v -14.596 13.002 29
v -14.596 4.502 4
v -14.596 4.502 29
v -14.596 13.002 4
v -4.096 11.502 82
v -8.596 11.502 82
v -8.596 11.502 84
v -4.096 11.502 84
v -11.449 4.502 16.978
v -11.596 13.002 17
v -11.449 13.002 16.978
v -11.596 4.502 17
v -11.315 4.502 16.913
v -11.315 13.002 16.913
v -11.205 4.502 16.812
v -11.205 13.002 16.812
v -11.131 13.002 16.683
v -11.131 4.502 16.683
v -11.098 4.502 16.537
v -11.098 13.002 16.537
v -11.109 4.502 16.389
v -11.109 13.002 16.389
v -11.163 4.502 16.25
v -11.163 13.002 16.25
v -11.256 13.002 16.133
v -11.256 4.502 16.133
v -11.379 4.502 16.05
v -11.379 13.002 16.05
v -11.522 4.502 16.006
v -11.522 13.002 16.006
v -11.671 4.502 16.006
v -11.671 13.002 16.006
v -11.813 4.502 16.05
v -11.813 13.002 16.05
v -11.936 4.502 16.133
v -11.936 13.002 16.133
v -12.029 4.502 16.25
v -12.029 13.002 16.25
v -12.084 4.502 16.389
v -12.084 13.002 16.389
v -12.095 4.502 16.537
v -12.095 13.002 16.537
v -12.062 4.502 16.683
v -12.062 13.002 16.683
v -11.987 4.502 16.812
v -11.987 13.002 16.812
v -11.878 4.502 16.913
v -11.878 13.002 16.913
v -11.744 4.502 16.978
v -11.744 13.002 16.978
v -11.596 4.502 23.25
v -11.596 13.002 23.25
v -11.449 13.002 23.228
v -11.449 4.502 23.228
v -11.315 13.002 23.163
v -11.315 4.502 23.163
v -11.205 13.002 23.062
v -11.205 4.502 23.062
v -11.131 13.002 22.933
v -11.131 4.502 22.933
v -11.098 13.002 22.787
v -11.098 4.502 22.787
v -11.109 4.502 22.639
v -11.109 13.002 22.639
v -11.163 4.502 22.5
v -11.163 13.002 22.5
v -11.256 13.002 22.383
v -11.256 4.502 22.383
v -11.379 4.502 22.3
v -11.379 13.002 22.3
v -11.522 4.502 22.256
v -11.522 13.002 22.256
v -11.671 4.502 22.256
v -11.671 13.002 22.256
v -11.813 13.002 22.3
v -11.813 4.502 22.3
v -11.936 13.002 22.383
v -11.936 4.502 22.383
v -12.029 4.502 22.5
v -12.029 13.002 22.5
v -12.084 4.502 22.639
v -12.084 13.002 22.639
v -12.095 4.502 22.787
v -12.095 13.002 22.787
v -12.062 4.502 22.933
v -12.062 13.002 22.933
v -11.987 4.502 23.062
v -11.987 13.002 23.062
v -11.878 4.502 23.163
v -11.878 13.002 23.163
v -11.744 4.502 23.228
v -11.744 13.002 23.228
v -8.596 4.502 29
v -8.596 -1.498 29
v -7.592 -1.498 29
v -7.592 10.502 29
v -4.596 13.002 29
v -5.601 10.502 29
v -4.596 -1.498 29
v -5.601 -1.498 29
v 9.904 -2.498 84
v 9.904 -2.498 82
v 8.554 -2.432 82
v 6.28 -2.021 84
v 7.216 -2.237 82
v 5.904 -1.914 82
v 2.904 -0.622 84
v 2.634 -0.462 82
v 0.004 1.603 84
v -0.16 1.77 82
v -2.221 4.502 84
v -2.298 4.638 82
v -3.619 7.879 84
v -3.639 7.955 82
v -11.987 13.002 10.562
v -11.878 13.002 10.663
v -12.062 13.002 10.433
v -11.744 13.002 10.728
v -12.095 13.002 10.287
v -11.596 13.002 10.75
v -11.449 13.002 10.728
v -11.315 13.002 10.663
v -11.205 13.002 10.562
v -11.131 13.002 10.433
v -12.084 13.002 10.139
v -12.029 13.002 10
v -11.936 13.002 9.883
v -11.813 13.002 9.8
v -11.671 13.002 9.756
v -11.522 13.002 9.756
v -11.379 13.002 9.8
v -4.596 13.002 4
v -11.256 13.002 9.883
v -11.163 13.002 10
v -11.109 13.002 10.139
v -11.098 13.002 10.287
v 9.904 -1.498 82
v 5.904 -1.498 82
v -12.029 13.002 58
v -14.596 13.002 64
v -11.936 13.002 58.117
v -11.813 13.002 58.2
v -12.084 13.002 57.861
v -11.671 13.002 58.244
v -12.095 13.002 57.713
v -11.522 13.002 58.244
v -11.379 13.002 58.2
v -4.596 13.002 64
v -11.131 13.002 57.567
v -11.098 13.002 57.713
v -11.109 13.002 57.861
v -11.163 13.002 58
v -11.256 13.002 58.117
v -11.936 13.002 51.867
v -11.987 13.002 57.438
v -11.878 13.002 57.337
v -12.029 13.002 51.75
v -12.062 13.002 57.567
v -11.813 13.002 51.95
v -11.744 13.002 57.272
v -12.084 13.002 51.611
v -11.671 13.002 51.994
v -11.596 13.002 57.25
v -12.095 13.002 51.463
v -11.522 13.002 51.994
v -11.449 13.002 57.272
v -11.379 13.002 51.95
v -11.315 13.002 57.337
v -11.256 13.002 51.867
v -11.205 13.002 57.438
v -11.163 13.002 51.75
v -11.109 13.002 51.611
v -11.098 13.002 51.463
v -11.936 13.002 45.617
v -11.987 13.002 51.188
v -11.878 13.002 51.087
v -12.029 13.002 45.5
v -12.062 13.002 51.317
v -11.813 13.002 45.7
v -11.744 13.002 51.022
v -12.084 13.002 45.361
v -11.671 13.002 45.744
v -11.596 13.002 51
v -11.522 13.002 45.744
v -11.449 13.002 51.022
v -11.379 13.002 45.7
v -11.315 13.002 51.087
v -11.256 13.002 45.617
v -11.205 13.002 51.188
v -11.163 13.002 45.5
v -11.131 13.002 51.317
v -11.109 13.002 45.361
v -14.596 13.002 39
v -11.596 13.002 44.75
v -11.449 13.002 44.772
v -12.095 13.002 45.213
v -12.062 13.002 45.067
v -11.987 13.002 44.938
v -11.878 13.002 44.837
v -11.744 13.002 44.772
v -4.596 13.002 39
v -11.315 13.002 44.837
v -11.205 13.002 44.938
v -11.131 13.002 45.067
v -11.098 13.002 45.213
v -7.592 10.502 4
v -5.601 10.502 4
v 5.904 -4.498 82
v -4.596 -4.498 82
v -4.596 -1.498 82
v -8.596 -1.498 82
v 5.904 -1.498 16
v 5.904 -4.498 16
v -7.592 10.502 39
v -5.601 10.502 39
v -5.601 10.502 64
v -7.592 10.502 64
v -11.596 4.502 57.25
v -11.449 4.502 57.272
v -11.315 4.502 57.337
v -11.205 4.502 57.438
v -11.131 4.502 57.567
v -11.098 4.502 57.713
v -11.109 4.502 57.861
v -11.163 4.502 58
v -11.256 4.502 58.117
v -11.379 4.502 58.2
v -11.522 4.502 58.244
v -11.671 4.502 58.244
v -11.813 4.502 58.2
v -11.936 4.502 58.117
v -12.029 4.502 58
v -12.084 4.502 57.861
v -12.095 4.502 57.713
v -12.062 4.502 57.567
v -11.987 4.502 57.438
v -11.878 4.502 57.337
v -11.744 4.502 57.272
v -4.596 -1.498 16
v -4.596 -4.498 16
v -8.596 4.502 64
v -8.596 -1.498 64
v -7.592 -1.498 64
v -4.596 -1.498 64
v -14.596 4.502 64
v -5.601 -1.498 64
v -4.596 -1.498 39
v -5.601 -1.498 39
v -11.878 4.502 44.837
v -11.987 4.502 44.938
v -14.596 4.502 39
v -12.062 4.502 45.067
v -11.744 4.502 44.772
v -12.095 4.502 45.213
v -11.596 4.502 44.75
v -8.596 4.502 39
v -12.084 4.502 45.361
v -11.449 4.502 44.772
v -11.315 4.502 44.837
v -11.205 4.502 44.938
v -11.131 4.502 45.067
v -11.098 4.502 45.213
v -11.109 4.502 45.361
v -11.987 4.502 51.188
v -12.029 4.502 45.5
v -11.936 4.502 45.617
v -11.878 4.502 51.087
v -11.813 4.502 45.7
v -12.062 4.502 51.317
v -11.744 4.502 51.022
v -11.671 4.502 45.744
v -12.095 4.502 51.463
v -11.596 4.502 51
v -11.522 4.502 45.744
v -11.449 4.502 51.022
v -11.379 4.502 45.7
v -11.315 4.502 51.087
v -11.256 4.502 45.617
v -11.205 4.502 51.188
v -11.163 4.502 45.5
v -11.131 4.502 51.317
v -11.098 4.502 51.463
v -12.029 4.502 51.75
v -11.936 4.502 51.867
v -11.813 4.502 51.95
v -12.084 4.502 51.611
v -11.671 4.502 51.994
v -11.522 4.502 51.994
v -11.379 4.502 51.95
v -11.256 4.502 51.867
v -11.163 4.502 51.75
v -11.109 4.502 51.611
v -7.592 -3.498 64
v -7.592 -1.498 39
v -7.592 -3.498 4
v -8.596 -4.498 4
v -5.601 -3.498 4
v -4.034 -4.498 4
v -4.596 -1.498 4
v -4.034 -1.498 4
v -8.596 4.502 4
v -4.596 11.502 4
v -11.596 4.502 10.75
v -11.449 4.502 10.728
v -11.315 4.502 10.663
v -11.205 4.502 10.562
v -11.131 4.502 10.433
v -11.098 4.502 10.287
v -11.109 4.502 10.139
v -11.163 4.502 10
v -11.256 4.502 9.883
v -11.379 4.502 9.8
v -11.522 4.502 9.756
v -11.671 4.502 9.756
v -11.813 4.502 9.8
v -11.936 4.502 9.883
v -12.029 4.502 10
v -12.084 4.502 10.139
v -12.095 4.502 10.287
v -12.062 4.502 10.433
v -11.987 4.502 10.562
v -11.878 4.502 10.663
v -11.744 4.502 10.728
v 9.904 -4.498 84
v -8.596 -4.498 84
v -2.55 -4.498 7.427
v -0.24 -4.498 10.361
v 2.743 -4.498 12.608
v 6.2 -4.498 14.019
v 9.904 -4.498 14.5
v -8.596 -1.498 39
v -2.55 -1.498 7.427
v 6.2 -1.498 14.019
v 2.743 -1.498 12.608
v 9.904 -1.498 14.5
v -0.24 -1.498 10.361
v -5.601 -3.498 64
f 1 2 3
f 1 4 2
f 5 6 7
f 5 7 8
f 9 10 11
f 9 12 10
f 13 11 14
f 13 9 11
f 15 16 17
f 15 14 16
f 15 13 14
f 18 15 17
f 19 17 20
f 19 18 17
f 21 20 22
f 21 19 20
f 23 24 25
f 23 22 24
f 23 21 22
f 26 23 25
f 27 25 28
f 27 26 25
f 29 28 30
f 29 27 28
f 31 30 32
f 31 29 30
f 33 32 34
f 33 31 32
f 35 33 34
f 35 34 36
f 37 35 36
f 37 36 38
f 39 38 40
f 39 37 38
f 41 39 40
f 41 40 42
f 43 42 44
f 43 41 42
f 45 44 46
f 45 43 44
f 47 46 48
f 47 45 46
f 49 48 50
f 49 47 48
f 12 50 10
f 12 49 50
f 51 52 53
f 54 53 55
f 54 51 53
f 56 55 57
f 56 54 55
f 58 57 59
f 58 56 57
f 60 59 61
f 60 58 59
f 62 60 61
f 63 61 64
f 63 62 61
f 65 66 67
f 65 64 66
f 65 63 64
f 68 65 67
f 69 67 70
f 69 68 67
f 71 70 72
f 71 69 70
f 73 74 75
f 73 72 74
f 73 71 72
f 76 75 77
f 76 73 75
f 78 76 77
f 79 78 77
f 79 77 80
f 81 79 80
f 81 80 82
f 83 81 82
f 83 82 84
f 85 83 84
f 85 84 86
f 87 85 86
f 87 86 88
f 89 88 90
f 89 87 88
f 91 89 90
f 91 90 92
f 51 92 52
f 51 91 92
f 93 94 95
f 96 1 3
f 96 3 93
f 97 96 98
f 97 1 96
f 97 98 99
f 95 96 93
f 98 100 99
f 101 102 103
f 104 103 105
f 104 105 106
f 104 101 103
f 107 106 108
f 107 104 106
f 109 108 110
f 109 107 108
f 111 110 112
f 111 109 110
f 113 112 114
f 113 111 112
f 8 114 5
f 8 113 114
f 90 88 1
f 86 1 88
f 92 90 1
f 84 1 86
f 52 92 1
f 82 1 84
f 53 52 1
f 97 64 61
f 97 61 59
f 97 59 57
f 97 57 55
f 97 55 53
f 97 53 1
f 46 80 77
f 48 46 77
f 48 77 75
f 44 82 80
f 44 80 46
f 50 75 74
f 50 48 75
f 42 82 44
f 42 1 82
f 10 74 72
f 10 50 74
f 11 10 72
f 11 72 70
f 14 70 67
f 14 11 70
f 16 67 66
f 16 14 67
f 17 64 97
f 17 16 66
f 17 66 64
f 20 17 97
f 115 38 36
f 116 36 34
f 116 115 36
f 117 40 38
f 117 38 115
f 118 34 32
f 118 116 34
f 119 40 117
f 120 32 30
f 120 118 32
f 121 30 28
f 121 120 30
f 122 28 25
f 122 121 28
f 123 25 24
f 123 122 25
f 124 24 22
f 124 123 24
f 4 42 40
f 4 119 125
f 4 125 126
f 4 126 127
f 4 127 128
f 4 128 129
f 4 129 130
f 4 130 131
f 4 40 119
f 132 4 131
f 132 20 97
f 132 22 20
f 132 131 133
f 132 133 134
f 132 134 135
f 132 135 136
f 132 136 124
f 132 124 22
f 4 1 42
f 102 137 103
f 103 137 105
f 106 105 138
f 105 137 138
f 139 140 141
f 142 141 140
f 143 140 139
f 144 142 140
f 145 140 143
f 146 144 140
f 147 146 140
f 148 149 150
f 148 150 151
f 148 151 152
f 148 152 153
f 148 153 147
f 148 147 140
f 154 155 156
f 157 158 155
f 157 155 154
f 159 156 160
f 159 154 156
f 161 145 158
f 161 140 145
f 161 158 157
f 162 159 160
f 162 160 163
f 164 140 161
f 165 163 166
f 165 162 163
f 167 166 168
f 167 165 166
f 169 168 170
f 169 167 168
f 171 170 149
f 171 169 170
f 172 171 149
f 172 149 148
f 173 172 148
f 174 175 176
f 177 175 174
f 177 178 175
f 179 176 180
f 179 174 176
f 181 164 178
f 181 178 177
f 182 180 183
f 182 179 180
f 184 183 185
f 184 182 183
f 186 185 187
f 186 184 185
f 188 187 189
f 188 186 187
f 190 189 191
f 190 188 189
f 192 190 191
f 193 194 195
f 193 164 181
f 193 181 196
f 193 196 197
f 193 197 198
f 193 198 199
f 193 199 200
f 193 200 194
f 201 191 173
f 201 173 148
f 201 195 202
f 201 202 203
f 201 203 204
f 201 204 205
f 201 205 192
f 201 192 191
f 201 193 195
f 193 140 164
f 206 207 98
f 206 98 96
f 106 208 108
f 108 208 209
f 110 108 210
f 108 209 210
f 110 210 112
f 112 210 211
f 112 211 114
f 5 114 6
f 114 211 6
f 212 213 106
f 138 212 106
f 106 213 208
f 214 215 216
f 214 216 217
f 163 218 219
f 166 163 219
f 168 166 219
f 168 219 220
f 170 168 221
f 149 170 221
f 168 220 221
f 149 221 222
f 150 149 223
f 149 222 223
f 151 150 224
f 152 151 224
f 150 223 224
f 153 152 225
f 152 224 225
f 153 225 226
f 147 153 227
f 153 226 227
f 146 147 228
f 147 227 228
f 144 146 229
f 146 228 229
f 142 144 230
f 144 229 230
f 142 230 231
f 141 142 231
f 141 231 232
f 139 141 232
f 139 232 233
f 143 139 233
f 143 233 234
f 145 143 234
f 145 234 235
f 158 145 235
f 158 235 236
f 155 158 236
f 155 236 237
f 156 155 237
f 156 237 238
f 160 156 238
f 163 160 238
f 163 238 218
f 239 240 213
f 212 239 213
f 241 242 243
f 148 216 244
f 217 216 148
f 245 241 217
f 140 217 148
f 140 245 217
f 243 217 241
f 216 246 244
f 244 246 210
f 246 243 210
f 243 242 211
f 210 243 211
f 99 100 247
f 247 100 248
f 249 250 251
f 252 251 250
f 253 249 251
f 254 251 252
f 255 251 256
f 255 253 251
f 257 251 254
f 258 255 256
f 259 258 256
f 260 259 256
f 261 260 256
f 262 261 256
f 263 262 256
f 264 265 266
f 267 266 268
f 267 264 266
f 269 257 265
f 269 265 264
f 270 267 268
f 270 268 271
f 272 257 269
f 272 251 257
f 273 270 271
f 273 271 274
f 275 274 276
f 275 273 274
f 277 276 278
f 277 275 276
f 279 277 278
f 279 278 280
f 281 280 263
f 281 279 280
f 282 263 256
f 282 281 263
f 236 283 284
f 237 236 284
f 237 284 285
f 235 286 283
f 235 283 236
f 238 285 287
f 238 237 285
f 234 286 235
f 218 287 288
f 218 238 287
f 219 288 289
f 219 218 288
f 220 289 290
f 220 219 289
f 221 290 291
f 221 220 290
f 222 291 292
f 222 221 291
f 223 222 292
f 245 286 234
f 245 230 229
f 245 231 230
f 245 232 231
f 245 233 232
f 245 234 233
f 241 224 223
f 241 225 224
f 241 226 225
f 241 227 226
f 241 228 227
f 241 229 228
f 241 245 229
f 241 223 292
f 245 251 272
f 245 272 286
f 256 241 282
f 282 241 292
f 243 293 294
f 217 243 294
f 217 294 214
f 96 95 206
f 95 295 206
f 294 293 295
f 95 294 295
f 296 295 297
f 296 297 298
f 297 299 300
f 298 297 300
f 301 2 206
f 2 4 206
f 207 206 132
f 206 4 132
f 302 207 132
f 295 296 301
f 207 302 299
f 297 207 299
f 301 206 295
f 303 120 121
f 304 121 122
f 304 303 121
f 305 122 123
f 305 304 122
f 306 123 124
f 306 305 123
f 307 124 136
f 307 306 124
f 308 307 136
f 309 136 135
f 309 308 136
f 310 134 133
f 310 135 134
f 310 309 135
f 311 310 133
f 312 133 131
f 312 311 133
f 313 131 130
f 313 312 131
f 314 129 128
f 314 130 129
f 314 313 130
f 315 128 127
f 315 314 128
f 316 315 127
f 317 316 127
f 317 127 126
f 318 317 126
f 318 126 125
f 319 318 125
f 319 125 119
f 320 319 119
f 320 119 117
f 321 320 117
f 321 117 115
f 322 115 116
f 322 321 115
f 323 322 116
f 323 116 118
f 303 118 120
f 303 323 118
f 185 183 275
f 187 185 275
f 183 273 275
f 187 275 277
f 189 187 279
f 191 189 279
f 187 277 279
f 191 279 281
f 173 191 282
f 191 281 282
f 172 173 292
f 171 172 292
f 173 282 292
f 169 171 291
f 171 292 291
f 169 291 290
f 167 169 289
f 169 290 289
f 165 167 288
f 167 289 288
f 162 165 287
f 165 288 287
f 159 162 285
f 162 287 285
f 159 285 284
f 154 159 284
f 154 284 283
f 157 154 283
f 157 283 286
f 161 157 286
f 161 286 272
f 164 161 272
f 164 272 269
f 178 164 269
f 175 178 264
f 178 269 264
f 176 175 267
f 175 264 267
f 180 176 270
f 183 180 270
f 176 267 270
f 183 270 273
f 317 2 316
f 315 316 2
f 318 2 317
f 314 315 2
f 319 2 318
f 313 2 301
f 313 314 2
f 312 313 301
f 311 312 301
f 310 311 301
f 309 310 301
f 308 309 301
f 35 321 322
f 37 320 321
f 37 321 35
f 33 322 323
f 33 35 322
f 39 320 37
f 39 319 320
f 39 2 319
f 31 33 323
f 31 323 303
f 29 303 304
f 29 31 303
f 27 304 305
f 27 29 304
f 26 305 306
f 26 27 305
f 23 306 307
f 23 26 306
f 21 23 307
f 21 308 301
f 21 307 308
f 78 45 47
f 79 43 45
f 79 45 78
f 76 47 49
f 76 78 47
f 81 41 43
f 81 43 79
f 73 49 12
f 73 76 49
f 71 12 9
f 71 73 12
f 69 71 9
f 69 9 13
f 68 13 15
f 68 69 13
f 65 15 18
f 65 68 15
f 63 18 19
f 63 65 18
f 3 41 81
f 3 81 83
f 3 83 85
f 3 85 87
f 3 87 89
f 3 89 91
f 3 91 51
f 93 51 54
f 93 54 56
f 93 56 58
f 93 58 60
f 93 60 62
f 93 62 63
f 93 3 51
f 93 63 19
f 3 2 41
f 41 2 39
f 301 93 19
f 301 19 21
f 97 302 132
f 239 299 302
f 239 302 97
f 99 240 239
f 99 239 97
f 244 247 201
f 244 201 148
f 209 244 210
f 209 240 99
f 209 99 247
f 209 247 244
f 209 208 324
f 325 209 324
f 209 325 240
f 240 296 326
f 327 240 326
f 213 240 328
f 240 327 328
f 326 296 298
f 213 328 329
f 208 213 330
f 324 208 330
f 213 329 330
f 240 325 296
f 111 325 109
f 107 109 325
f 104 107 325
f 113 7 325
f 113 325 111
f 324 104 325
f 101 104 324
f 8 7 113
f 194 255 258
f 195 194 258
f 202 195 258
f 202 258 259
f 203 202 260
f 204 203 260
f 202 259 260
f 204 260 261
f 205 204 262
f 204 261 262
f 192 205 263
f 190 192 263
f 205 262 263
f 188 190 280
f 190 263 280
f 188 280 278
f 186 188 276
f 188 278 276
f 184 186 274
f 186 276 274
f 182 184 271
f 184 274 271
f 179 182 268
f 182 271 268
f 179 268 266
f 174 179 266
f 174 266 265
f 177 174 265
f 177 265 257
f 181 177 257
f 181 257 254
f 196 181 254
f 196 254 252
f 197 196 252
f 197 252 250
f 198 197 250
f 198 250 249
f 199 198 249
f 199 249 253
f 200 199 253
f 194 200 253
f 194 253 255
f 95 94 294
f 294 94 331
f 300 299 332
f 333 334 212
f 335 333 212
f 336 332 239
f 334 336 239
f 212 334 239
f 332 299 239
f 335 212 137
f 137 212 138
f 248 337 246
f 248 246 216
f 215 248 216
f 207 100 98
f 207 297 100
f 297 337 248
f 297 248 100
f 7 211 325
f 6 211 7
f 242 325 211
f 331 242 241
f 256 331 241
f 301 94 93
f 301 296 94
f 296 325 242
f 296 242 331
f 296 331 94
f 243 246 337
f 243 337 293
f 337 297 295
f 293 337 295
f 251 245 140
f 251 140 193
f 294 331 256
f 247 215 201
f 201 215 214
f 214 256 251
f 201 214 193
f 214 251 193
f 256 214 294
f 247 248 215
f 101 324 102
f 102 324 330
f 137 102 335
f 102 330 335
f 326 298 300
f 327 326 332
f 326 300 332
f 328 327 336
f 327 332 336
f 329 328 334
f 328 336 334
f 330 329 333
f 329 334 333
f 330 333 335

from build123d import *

# Parameters (mm, degrees)
SALIENTE_EXTRUIR1_DEPTH = 82
CROQUIS3_W              = 10
CROQUIS3_H              = 25
SALIENTE_EXTRUIR2_DEPTH = 1.5
CROQUIS4_W              = 18.5
CROQUIS4_H              = 16
SALIENTE_EXTRUIR3_DEPTH = 2
CROQUIS5_R              = 14.5
CORTAR_EXTRUIR1_DEPTH   = 87.482953955
CROQUIS13_W             = 7.672796091
CROQUIS13_H             = 18.470403829
CROQUIS13_W_2           = 10
CROQUIS13_H_2           = 13
CROQUIS13_W_3           = 18
CORTAR_EXTRUIR9_DEPTH   = 13
CORTAR_EXTRUIR10_DEPTH  = 2
CROQUIS15_W             = 1.990683477
CROQUIS15_H             = 14
CORTAR_EXTRUIR11_DEPTH  = 60
CROQUIS16_W             = 10.5
CROQUIS16_H             = 66
CORTAR_EXTRUIR12_DEPTH  = 10
CROQUIS19_W             = 6
CROQUIS19_H             = 25
SALIENTE_EXTRUIR7_DEPTH = 7
CROQUIS23_R             = 0.5
CORTAR_EXTRUIR13_DEPTH  = 86.732440329


with BuildPart() as part:
    # Croquis2 → Saliente-Extruir1 (new body)
    with BuildSketch(Plane.XY):
        Polygon((-4.596277774, 11.502403514), (-4.596277774, -1.497596486), (9.903722226, -1.497596486), (9.903722226, -4.497596486), (-4.596277774, -4.497596486), (-8.596277774, -4.497596486), (-8.596277774, 11.502403514), align=None)
    extrude(amount=SALIENTE_EXTRUIR1_DEPTH)

    # Croquis3 → Saliente-Extruir2 (add)
    with BuildSketch(Plane(origin=(0, 11.502403514, 0), x_dir=(1, 0, 0), z_dir=(0, 1, 0))):
        with Locations((-9.596277774, -16.5)):
            Rectangle(CROQUIS3_W, CROQUIS3_H)
        with Locations((-9.596277774, -51.5)):
            Rectangle(CROQUIS3_W, CROQUIS3_H)
    extrude(amount=SALIENTE_EXTRUIR2_DEPTH)

    # Croquis4 → Saliente-Extruir3 (add)
    with BuildSketch(Plane.XY.offset(82)):
        with Locations((0.653722226, 3.502403514)):
            Rectangle(CROQUIS4_W, CROQUIS4_H)
    extrude(amount=SALIENTE_EXTRUIR3_DEPTH)

    # Croquis5 → Cortar-Extruir1 (cut, through all)
    with BuildSketch(Plane(origin=(0, -1.497596486, 0), x_dir=(1, 0, 0), z_dir=(0, 1, 0))):
        with Locations((9.903722226, 0)):
            Circle(CROQUIS5_R)
    extrude(amount=-CORTAR_EXTRUIR1_DEPTH, mode=Mode.SUBTRACT)

    # Croquis13 → Cortar-Extruir9 (cut)
    with BuildSketch(Plane.ZY.offset(8.596277774)):
        with Locations((0.163601954, 2.2672016)):
            Rectangle(CROQUIS13_W, CROQUIS13_H)
        with Locations((34, 5.002403514)):
            Rectangle(CROQUIS13_W_2, CROQUIS13_H_2)
        with Locations((73, 5.002403514)):
            Rectangle(CROQUIS13_W_3, CROQUIS13_H_2)
    extrude(amount=-CORTAR_EXTRUIR9_DEPTH, mode=Mode.SUBTRACT)

    # Croquis14 → Cortar-Extruir10 (cut)
    with BuildSketch(Plane.XY.offset(84)):
        with BuildLine():
            Line((-4.096277774, 11.502403514), (9.903722226, 11.502403514))
            Line((9.903722226, 11.502403514), (9.903722226, -2.497596486))
            ThreePointArc((9.903722226, -2.497596486), (0.00422729, 1.602908577), (-4.096277774, 11.502403514))
        make_face()
    extrude(amount=-CORTAR_EXTRUIR10_DEPTH, mode=Mode.SUBTRACT)

    # Croquis15 → Cortar-Extruir11 (cut)
    with BuildSketch(Plane(origin=(0, 0, 4), x_dir=(-1, 0, 0), z_dir=(0, 0, -1))):
        with Locations((6.596277774, 3.502403514)):
            Rectangle(CROQUIS15_W, CROQUIS15_H)
    extrude(amount=-CORTAR_EXTRUIR11_DEPTH, mode=Mode.SUBTRACT)

    # Croquis16 → Cortar-Extruir12 (cut)
    with BuildSketch(Plane.XZ.offset(4.497596486)):
        with Locations((0.653722226, 49)):
            Rectangle(CROQUIS16_W, CROQUIS16_H)
    extrude(amount=-CORTAR_EXTRUIR12_DEPTH, mode=Mode.SUBTRACT)

    # Croquis19 → Saliente-Extruir7 (add)
    with BuildSketch(Plane.XZ.offset(-11.502403514)):
        with Locations((-11.596277774, 16.5)):
            Rectangle(CROQUIS19_W, CROQUIS19_H)
        with Locations((-11.596277774, 51.5)):
            Rectangle(CROQUIS19_W, CROQUIS19_H)
    extrude(amount=SALIENTE_EXTRUIR7_DEPTH)

    # Croquis23 → Cortar-Extruir13 (cut, symmetric)
    with BuildSketch(Plane.XZ.offset(-4.502403514)):
        with Locations(Location((-11.596277774, 45.25, 0), (0, 0, 270))):
            Circle(CROQUIS23_R)
        with Locations(Location((-11.596277774, 57.75, 0), (0, 0, 270))):
            Circle(CROQUIS23_R)
        with Locations(Location((-11.596277774, 51.5, 0), (0, 0, 270))):
            Circle(CROQUIS23_R)
    cortar_extruir13 = extrude(amount=CORTAR_EXTRUIR13_DEPTH, both=True, mode=Mode.SUBTRACT)

    # Simetría1: Cortar-Extruir13 across plane
    add(cortar_extruir13.mirror(Plane(origin=(0, 0, 34), x_dir=(1, 0, 0), z_dir=(0, 0, -1))), mode=Mode.SUBTRACT)


solid = part.part
